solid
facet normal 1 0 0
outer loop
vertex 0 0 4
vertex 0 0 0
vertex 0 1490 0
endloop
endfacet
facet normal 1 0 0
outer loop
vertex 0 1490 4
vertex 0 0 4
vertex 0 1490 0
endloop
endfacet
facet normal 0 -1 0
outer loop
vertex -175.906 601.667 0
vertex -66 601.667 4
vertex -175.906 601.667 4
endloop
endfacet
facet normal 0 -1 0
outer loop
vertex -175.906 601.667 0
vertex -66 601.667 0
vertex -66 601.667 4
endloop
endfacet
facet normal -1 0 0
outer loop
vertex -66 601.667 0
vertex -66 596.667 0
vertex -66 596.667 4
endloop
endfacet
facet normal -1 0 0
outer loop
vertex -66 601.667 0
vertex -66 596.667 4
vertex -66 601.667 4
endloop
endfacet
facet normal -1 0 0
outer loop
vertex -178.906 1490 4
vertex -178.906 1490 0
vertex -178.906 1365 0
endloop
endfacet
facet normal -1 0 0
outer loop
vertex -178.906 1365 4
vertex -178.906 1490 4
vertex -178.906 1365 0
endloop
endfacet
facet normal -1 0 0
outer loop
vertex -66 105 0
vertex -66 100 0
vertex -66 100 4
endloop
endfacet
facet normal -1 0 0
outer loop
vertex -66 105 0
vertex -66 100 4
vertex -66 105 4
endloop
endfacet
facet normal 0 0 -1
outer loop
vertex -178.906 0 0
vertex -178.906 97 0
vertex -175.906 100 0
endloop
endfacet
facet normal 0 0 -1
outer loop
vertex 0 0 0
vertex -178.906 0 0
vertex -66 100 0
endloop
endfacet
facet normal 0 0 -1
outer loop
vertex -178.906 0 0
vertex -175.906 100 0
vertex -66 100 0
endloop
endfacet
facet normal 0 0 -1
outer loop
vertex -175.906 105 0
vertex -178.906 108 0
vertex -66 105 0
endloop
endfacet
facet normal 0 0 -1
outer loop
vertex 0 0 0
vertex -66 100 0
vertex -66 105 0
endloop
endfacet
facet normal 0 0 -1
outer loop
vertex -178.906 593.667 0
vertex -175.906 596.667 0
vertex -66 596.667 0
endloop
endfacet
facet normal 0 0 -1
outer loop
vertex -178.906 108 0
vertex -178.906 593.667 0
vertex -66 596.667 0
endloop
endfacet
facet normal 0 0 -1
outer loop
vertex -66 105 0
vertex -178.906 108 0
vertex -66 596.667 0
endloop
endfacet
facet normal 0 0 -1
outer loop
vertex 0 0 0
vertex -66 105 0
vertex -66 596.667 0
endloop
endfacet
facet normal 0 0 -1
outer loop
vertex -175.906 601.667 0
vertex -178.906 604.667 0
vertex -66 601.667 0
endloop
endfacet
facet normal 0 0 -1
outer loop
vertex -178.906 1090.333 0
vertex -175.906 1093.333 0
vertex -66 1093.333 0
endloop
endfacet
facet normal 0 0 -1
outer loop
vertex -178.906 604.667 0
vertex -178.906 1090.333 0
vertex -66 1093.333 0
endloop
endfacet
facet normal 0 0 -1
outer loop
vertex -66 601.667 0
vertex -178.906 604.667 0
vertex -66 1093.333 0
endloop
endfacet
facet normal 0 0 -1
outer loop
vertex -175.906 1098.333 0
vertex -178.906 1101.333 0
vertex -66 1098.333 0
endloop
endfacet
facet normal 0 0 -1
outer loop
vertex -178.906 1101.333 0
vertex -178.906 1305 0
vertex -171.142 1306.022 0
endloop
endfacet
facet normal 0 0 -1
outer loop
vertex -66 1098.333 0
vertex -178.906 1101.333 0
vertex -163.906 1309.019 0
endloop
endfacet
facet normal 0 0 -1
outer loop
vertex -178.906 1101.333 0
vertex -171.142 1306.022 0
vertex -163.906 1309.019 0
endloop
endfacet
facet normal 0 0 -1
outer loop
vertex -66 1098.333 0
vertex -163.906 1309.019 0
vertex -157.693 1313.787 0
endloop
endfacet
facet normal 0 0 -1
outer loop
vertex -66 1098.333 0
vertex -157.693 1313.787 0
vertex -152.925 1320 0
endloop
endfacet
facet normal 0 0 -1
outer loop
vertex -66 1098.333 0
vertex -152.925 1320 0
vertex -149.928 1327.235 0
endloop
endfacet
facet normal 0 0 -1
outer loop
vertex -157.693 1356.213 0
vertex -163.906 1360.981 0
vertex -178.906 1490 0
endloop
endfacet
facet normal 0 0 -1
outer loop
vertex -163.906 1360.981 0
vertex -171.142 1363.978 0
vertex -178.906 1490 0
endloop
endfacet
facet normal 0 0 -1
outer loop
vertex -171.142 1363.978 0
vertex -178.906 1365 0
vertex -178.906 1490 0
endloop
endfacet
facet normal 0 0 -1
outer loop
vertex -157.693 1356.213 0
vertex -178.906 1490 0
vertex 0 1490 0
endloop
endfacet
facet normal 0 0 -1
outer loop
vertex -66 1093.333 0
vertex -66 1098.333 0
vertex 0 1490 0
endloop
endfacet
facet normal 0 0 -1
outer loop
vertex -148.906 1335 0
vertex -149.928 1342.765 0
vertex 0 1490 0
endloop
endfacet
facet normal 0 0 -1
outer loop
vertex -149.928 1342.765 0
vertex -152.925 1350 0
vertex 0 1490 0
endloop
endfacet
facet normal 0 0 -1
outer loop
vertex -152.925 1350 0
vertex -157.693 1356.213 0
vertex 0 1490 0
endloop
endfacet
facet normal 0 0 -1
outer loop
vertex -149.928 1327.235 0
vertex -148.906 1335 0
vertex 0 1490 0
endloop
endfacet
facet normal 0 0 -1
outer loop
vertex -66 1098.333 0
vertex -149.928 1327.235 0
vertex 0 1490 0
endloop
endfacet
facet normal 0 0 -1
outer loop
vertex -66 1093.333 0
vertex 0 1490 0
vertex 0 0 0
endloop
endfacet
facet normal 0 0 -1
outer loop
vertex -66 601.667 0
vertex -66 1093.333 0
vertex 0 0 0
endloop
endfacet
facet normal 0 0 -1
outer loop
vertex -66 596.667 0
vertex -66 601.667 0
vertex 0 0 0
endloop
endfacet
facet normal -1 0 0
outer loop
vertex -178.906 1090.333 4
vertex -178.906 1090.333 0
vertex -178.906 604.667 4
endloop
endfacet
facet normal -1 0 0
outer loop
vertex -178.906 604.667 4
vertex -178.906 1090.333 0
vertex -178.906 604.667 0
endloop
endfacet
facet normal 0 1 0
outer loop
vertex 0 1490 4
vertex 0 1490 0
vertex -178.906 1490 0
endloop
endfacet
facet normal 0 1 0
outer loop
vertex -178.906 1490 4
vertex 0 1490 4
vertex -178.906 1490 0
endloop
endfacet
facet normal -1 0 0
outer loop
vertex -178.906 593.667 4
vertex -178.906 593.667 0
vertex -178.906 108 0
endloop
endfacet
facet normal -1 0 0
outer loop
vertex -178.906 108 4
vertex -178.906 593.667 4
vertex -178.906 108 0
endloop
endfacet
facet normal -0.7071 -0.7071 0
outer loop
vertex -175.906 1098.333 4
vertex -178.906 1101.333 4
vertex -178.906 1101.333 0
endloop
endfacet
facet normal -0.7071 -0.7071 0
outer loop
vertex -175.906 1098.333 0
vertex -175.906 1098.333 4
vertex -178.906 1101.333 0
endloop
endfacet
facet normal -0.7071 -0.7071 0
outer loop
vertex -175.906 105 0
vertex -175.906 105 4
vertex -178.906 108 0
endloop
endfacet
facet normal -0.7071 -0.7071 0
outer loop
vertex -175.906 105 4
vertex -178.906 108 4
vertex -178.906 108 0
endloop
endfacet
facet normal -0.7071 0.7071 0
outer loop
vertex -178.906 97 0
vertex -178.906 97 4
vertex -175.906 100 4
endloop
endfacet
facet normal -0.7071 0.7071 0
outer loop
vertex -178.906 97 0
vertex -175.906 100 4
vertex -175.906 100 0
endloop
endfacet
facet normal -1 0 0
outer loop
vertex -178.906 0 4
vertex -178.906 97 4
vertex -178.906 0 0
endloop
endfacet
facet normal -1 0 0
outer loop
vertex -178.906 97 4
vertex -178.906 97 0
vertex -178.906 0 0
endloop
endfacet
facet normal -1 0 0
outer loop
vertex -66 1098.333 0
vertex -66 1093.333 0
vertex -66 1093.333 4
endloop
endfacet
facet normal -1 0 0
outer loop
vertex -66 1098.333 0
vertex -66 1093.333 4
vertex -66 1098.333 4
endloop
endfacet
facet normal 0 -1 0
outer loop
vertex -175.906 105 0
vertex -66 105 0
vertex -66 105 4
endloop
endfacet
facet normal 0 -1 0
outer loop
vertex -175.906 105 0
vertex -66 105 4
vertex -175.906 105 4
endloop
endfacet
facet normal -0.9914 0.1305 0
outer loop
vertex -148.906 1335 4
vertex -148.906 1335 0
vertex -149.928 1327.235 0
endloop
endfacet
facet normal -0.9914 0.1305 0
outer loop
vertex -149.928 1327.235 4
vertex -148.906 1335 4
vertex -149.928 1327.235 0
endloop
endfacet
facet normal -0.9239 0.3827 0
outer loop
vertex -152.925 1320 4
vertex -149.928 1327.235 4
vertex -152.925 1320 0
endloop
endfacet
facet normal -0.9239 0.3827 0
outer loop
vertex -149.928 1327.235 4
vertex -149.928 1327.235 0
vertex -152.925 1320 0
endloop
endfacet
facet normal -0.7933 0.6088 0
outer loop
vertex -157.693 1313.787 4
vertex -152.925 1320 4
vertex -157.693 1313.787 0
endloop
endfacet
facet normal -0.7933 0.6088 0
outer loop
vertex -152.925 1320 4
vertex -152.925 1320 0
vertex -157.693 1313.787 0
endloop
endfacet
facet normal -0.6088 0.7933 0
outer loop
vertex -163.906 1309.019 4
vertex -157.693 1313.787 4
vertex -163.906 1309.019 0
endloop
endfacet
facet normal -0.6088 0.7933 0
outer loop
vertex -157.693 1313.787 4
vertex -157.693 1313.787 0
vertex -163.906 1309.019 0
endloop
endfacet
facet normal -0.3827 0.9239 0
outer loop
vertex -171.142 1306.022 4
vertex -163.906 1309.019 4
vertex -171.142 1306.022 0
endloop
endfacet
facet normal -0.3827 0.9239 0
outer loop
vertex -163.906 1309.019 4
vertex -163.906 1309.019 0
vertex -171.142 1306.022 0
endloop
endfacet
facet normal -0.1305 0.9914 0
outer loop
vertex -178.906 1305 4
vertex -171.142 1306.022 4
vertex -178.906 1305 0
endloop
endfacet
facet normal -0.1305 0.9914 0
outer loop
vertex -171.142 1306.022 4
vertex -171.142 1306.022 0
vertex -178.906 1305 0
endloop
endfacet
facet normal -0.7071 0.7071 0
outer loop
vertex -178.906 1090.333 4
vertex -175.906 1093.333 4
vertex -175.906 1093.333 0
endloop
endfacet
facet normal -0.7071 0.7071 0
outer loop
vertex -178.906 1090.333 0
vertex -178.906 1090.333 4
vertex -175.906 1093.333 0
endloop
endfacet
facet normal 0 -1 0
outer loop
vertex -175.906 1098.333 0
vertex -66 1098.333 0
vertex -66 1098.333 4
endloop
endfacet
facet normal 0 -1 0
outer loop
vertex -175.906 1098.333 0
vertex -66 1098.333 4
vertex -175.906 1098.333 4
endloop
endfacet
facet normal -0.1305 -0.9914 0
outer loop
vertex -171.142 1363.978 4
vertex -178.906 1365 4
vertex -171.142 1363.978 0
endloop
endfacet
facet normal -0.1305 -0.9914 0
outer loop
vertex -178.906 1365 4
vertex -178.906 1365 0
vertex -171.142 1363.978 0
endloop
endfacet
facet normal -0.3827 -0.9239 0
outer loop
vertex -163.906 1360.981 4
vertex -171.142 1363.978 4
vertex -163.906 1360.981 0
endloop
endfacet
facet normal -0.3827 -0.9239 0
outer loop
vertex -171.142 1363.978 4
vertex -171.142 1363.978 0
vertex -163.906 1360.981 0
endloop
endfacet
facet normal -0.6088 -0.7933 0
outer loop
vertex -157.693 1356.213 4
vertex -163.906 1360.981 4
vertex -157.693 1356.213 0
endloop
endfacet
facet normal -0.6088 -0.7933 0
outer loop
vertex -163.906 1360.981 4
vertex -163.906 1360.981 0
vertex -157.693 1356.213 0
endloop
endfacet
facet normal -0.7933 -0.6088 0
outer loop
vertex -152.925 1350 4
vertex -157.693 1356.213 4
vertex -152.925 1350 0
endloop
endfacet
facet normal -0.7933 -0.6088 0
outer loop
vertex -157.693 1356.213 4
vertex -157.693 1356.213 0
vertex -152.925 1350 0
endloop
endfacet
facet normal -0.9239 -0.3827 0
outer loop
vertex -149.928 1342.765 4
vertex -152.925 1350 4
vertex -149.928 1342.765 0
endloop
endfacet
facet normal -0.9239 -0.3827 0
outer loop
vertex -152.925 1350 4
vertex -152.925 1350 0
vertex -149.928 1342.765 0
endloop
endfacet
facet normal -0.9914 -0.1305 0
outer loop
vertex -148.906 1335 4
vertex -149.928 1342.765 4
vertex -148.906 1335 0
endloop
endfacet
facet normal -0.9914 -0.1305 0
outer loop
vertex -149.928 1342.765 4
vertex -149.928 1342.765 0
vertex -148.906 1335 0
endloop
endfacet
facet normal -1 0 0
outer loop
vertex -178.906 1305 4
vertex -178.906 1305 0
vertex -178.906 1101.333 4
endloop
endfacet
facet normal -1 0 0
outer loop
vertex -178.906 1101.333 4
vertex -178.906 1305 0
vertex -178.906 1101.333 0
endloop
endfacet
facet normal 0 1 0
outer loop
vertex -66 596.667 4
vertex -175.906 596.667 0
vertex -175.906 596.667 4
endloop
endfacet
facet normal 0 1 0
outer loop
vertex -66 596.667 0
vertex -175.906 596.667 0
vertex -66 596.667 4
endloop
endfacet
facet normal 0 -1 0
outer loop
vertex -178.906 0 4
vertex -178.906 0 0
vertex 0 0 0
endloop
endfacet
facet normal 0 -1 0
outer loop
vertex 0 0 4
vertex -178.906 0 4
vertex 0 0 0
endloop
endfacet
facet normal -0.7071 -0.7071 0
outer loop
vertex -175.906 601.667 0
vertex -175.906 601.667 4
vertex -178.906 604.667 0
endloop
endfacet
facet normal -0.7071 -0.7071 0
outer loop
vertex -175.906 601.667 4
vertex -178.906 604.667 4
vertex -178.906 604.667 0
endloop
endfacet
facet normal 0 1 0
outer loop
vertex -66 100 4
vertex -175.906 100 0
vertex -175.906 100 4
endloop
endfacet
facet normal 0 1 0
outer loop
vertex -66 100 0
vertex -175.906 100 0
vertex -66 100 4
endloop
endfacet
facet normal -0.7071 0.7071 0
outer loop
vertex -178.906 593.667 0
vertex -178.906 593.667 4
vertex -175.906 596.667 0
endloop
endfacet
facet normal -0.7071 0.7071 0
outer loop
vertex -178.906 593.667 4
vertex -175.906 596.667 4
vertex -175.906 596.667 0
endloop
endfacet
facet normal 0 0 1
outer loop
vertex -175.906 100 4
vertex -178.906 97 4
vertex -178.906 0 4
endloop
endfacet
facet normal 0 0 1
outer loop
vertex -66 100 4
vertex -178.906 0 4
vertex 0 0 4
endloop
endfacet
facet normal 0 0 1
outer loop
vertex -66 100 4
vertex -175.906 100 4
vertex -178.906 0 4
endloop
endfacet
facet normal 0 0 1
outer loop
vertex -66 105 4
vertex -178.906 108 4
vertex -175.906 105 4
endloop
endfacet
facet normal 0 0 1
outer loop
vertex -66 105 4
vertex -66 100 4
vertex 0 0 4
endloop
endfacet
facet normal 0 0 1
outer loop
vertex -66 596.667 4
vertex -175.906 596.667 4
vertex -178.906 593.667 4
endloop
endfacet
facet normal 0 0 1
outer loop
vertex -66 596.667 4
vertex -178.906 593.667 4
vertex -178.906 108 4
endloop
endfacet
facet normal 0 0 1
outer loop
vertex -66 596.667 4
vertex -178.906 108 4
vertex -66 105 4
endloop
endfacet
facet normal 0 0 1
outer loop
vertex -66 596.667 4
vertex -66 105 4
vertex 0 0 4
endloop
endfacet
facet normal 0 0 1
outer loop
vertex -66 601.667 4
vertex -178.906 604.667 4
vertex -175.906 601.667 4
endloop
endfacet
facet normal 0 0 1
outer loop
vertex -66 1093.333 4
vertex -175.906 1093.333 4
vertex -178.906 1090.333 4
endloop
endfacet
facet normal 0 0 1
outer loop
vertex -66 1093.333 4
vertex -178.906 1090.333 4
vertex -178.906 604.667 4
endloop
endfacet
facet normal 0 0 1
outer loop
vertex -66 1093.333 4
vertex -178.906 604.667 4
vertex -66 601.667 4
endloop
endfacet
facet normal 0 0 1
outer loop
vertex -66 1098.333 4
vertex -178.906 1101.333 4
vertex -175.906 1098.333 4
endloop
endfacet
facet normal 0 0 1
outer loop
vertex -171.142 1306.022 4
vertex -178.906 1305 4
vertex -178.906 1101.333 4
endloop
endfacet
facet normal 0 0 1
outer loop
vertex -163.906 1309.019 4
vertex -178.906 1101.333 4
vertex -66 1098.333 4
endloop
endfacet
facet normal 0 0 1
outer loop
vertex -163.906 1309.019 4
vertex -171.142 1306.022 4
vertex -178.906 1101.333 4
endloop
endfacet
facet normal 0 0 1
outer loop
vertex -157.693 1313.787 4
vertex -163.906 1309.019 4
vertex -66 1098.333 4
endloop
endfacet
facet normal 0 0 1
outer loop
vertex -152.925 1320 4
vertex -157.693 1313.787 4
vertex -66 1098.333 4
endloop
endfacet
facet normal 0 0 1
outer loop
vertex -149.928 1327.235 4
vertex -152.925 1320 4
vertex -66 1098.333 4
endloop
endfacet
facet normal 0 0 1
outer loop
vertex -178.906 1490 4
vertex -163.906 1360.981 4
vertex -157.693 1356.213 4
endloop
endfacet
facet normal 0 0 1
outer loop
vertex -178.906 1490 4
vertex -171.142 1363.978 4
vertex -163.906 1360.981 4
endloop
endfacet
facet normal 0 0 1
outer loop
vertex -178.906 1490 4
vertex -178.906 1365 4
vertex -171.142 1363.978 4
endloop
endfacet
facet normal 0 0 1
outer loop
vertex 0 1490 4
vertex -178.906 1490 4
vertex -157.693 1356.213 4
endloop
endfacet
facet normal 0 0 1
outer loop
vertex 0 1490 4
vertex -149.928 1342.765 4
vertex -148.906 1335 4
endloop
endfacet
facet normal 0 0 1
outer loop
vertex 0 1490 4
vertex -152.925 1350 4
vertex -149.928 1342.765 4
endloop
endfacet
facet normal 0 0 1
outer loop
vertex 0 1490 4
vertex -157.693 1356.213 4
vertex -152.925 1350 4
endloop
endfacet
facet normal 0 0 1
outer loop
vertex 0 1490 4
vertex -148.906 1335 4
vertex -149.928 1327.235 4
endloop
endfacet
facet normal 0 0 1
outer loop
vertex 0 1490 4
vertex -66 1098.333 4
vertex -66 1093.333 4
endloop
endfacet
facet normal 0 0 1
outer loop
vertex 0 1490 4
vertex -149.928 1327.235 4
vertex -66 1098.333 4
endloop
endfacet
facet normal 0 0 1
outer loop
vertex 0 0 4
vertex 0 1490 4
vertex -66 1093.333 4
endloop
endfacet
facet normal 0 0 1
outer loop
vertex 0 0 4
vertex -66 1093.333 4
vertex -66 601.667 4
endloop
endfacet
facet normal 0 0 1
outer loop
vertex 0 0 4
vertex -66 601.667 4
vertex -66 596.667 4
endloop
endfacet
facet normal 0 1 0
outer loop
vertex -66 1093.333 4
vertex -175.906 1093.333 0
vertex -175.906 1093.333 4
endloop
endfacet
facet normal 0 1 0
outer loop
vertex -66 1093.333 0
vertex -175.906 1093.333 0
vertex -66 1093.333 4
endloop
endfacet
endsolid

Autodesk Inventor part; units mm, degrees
ref_plane "YZ Plane" through (0, 0, 0) normal (1, 0, 0) x (0, 1, 0)
ref_plane "XZ Plane" through (0, 0, 0) normal (0, 1, 0) x (-1, 0, 0)
ref_plane "XY Plane" through (0, 0, 0) normal (0, 0, 1) x (1, 0, 0)
sketch "Sketch1" plane through (0, 0, 0) normal (0, 0, 1) x (1, 0, 0)
  line L0 (0, 1490) -> (-178.9061, 1490)
  line L1 (-178.9061, 1490) -> (-178.9061, 0)
  line L2 (-178.9061, 0) -> (0, 0)
  line L3 (0, 0) -> (0, 1490)
  line L4 (-178.9061, 100) -> (-66, 100)
  line L5 (-66, 100) -> (-66, 105)
  line L6 (-66, 105) -> (-178.9061, 105)
  line L7 (-178.9061, 105) -> (-178.9061, 100)
  line L8 (-178.9061, 596.6667) -> (-66, 596.6667)
  line L9 (-66, 596.6667) -> (-66, 601.6667)
  line L10 (-66, 601.6667) -> (-178.9061, 601.6667)
  line L11 (-178.9061, 601.6667) -> (-178.9061, 596.6667)
  line L12 (-178.9061, 1093.3333) -> (-66, 1093.3333)
  line L13 (-66, 1093.3333) -> (-66, 1098.3333)
  line L14 (-66, 1098.3333) -> (-178.9061, 1098.3333)
  line L15 (-178.9061, 1098.3333) -> (-178.9061, 1093.3333)
  circle A0 centre (-178.9061, 1335) radius 30
  point P0 (-178.9061, 1098.3333)
  point P1 (-178.9061, 1093.3333)
  point P2 (-178.9061, 596.6667)
  point P3 (-178.9061, 105)
  point P4 (-178.9061, 1365)
  point P5 (-178.9061, 1305)
  dimension "d0" = 1490
  dimension "d1" = 178.9061
  dimension "d2" = 5
  dimension "d4" = 100
  dimension "d7" = 496.6667
  dimension "d23" = 66
  dimension "d29" = 60
  dimension "d30" = 1335
extrude "Plate1" add sketch "Sketch1" along normal blind 4 contours L3 L2 L1 L4 L5 L6 L8 L9 L10 L12 L13 L14 A0 L0
chamfer "Corner Chamfer1" distance 3 angle 45 6 edges at (-178.9061, 100, 2) (-178.9061, 105, 2) (-178.9061, 596.6667, 2) (-178.9061, 601.6667, 2) (-178.9061, 1098.3333, 2) (-178.9061, 1093.3333, 2)
equation "\"d0\" = Стрингер_длина"
equation "\"d1\" = стрингер_глубина_2"
equation "\"d2\" = паз_под_стрингер_толщина"
equation "\"d7\" = Шаг_шпангоутов"
equation "\"d23\" = паз_под_стрингер_глубина - Thickness"
equation "\"d29\" = 2 * радиус_выреза_под_сварку"
equation "\"d12\" = Thickness"
equation "\"BendRadius\" = Thickness"
equation "\"BendReliefWidth\" = Thickness"
equation "\"BendReliefDepth\" = 0.5 * Thickness"
equation "\"CornerReliefSize\" = 4 * Thickness"
equation "\"MinimumRemnant\" = 2 * Thickness"
equation "\"TransitionRadius\" = BendRadius"
equation "\"JacobiRadiusSize\" = BendRadius"
equation "\"GapSize\" = Thickness"
equation "\"Стрингер_длина\" = 1490"
equation "\"стрингер_глубина_2\" = 178.906141"
equation "\"паз_под_стрингер_толщина\" = 5"
equation "\"Шаг_шпангоутов\" = 496.666667"
equation "\"паз_под_стрингер_глубина\" = 70"
equation "\"Thickness\" = 4"
equation "\"радиус_выреза_под_сварку\" = 30"
properties part number "0414 GBK stringer C2" material "Steel"
